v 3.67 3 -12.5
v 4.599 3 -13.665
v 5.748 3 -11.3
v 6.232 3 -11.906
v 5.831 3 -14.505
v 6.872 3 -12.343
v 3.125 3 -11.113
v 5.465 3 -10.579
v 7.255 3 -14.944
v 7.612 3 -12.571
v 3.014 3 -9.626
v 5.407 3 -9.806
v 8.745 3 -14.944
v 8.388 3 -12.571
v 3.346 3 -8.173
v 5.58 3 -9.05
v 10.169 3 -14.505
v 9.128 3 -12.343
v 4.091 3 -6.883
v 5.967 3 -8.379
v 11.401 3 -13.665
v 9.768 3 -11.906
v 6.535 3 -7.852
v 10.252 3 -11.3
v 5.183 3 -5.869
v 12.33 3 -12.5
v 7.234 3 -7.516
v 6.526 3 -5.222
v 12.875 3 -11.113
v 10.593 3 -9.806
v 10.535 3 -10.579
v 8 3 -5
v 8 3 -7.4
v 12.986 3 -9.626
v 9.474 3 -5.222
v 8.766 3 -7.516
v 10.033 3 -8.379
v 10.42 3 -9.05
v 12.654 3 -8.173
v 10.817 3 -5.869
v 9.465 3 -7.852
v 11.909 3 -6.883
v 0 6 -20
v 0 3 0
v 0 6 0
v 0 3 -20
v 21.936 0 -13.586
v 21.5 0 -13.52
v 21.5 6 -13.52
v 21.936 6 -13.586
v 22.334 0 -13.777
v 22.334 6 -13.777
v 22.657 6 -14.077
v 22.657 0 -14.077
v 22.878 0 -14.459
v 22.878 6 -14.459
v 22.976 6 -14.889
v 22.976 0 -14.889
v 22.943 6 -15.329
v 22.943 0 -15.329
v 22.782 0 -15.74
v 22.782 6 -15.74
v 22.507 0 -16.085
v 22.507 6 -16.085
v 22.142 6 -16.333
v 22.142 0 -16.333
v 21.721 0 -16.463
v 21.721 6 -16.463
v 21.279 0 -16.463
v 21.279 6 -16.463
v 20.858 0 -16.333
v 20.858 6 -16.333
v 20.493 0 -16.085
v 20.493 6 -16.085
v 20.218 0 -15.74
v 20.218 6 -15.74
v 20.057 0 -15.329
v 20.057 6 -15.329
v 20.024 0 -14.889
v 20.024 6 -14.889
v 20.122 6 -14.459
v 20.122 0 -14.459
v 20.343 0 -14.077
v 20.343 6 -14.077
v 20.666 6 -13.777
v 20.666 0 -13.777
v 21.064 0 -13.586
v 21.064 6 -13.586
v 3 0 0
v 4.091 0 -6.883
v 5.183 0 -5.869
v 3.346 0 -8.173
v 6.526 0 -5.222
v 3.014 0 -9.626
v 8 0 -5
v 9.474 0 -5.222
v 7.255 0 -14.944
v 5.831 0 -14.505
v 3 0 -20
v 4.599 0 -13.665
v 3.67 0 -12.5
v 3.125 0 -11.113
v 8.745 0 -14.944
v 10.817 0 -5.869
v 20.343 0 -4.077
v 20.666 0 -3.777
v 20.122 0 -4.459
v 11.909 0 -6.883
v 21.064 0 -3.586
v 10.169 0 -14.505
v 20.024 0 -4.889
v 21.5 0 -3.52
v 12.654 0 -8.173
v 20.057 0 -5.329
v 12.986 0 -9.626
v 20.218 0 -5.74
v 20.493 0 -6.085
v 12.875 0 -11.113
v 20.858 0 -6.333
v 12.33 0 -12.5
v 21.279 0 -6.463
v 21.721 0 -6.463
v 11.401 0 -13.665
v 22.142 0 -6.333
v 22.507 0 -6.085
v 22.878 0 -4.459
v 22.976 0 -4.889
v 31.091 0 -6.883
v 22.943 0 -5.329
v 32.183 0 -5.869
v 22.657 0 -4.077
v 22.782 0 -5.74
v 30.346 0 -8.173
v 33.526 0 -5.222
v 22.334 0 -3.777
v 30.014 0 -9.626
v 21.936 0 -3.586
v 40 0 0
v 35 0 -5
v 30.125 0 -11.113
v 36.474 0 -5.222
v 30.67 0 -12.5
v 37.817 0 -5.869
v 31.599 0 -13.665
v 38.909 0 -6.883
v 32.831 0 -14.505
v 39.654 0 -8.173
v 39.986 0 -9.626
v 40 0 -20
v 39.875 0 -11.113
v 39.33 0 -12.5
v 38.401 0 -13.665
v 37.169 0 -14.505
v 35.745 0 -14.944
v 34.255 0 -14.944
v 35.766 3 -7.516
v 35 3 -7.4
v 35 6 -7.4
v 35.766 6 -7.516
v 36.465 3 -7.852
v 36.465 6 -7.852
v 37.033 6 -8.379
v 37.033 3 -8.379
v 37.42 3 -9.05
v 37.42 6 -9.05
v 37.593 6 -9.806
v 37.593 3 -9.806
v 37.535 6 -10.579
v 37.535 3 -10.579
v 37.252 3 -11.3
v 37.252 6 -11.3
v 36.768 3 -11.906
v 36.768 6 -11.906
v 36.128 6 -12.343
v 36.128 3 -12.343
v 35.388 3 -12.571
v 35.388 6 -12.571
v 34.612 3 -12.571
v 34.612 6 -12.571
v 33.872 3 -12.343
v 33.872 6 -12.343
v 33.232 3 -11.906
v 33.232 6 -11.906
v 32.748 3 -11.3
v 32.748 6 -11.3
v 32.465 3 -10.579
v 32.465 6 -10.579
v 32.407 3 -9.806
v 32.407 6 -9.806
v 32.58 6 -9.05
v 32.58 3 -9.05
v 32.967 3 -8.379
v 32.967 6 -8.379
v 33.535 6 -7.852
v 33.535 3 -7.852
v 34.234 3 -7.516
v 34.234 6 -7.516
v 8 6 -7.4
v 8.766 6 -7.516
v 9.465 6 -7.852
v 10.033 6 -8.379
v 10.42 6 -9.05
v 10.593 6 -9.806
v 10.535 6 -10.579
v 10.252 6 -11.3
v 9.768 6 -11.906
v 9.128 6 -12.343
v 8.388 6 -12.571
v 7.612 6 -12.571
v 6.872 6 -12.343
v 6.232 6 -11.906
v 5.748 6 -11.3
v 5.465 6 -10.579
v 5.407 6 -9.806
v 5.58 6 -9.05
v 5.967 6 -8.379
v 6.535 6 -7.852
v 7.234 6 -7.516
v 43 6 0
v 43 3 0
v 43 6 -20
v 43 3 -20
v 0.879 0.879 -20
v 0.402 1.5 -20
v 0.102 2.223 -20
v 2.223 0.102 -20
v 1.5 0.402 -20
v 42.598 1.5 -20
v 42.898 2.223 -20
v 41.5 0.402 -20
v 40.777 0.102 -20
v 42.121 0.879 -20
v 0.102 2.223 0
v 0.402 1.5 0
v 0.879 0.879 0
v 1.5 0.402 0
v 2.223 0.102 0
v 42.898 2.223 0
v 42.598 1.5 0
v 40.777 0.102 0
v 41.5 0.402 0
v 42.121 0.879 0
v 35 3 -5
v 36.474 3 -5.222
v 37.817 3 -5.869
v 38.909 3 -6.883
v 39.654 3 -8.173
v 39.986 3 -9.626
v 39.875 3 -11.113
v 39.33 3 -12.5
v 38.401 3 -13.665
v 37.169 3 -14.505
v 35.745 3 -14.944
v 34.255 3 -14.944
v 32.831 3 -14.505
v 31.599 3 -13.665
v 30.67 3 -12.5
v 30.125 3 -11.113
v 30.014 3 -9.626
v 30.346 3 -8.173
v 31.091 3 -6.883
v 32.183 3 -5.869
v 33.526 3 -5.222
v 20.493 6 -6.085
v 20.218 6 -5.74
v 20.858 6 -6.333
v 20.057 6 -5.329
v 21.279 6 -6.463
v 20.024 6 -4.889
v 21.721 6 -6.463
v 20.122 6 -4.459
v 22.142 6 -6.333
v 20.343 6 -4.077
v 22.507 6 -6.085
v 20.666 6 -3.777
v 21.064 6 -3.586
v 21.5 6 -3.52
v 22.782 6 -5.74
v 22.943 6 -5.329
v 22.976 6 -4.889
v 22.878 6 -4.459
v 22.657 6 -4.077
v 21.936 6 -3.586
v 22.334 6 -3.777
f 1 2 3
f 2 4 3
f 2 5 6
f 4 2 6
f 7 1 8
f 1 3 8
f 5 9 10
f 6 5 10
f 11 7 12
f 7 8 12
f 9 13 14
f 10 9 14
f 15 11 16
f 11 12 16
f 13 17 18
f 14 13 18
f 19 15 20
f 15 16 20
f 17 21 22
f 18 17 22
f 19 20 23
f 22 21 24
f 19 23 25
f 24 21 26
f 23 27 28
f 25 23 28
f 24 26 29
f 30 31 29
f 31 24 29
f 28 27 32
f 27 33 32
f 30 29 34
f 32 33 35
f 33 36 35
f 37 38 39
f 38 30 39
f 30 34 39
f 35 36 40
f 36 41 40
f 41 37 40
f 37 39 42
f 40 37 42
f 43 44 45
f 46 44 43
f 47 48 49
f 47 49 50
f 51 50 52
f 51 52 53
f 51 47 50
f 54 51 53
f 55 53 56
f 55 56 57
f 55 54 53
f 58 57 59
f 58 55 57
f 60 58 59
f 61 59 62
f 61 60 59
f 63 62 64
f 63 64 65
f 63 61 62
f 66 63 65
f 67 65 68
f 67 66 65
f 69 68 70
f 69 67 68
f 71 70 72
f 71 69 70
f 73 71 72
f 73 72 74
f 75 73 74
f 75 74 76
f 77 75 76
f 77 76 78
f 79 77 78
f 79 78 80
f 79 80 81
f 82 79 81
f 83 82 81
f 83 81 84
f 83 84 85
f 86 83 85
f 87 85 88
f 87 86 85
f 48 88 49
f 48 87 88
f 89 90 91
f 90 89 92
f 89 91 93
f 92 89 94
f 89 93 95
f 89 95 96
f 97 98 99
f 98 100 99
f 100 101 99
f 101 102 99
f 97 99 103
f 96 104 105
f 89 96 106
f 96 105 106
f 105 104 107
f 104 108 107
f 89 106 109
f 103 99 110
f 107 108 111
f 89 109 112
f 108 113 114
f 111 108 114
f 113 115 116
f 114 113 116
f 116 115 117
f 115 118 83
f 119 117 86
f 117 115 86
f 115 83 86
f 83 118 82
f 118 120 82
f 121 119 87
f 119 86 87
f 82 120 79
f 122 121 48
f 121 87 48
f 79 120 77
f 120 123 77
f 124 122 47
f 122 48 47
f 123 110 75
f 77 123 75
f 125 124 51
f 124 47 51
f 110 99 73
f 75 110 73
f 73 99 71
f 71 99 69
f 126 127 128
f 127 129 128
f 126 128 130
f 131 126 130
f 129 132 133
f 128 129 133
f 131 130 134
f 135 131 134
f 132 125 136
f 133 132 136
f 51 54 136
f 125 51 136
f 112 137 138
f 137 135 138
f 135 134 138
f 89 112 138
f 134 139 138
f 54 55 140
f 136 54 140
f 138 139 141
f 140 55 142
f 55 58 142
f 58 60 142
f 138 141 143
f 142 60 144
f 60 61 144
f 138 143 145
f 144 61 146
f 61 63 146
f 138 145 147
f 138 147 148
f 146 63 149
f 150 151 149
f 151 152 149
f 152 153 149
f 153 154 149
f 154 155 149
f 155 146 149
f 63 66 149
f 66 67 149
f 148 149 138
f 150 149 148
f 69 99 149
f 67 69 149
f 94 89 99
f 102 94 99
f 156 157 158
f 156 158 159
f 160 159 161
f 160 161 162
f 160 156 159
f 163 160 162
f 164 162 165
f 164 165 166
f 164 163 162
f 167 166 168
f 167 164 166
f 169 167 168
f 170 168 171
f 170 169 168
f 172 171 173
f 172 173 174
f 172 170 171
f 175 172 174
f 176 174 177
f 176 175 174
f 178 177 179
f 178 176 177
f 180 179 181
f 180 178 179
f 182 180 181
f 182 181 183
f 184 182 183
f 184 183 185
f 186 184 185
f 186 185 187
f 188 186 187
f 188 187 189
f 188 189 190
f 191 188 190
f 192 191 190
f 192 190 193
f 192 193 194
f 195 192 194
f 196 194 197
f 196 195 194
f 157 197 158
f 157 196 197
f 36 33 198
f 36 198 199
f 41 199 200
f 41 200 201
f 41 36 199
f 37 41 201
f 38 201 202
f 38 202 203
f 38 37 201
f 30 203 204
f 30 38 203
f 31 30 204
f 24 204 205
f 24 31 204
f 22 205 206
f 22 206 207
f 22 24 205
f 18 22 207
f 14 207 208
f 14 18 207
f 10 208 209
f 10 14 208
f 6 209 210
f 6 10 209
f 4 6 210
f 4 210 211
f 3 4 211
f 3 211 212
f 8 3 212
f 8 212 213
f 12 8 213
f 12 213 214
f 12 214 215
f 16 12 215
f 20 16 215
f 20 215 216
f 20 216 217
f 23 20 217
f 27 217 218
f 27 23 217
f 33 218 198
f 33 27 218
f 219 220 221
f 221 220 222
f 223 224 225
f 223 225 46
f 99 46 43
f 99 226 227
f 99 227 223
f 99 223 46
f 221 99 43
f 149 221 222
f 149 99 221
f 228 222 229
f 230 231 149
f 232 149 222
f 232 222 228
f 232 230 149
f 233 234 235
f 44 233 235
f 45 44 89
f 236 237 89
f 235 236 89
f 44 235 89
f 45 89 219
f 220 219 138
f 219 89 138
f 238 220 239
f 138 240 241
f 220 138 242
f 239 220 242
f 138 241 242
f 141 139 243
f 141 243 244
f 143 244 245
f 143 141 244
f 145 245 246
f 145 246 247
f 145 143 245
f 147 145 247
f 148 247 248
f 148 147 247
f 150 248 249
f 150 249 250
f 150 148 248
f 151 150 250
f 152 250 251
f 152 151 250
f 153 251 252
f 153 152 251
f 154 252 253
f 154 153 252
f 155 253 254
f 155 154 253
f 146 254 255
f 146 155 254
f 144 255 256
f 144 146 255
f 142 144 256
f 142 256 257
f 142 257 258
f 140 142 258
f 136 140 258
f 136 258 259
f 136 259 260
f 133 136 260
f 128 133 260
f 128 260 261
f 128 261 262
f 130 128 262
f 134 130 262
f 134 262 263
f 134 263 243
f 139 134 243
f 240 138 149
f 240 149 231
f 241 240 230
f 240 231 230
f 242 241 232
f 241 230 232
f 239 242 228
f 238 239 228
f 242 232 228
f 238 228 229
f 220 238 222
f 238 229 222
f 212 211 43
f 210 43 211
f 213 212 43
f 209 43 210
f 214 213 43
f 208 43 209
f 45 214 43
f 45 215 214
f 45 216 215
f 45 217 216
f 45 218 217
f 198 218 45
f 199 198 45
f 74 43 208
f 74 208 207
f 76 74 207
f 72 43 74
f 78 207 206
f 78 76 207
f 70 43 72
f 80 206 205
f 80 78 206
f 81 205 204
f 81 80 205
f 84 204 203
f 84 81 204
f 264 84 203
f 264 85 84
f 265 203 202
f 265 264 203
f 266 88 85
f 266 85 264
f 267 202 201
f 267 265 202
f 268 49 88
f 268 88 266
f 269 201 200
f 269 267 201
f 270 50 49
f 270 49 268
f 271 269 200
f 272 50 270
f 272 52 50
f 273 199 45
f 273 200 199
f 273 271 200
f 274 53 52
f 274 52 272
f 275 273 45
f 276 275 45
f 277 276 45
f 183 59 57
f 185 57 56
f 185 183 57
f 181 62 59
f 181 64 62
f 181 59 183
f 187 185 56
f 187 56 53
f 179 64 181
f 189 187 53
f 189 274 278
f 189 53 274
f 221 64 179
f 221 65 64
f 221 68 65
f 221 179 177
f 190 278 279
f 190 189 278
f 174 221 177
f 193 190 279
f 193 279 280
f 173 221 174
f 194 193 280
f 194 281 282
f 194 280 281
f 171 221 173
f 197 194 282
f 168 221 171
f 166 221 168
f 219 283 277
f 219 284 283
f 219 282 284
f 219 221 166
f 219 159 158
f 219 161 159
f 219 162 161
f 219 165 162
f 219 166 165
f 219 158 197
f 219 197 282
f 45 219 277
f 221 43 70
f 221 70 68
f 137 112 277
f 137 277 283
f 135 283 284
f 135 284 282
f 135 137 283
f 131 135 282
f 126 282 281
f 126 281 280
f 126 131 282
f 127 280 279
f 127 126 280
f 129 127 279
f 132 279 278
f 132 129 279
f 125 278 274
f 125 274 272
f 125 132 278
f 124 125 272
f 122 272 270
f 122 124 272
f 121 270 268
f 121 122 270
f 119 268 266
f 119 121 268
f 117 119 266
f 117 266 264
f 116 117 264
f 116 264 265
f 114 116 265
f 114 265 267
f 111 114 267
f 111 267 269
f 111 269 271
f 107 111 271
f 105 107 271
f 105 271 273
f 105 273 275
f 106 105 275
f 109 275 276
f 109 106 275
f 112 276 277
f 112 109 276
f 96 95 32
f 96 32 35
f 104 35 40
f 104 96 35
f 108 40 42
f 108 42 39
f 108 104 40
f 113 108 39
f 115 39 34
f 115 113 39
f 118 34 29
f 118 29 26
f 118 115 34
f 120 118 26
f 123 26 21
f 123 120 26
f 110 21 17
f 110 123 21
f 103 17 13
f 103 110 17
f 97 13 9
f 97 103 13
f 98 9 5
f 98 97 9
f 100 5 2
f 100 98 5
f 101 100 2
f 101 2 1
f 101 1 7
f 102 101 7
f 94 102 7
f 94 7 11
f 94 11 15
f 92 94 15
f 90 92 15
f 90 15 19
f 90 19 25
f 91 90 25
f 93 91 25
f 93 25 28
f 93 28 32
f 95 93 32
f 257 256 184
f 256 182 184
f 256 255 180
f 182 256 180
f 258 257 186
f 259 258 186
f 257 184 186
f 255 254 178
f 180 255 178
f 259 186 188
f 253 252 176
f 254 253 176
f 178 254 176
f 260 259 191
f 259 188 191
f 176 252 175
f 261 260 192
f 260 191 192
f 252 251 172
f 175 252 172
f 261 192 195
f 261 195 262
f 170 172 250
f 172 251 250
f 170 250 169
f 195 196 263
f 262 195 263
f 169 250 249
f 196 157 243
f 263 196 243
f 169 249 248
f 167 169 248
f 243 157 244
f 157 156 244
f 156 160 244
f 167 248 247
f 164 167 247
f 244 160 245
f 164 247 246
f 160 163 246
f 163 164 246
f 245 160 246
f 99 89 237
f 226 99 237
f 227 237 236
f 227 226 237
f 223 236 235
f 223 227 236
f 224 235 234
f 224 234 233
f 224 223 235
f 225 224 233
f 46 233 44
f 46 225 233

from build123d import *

# Parameters (mm, degrees)
SKETCH_1_W      = 43
SKETCH_1_H      = 20
SKETCH_1_R      = 5
SKETCH_1_R_2    = 1.48
EXTRUDE_1_DEPTH = 6
EXTRUDE_START   = -3
SKETCH_2_R      = 5
SKETCH_2_R_2    = 2.6
EXTRUDE_2_DEPTH = 3
FILLET_1_R      = 3


with BuildPart() as part:
    # 草图1 → 凸台-拉伸1 (new body)
    with BuildSketch(Plane(origin=(0, 0, 0), x_dir=(1, 0, 0), z_dir=(0, 1, 0))):
        with Locations((21.5, 10)):
            Rectangle(SKETCH_1_W, SKETCH_1_H)
        with Locations(Location((8, 10, 0), (0, 0, 270))):
            Circle(SKETCH_1_R, mode=Mode.SUBTRACT)
        with Locations(Location((35, 10, 0), (0, 0, 270))):
            Circle(SKETCH_1_R, mode=Mode.SUBTRACT)
        with Locations(Location((21.5, 15, 0), (0, 0, 270))):
            Circle(SKETCH_1_R_2, mode=Mode.SUBTRACT)
        with Locations(Location((21.5, 5, 0), (0, 0, 270))):
            Circle(SKETCH_1_R_2, mode=Mode.SUBTRACT)
    extrude(amount=EXTRUDE_1_DEPTH)

    # 草图2 → 凸台-拉伸2 (add)
    # profile 1 of 2: a face of its own
    with BuildSketch(Plane(origin=(0, 6, 0), x_dir=(1, 0, 0), z_dir=(0, 1, 0)).offset(EXTRUDE_START)):
        with Locations(Location((8, 10, 0), (0, 0, 270))):
            Circle(SKETCH_2_R)
        with Locations(Location((8, 10, 0), (0, 0, 270))):
            Circle(SKETCH_2_R_2, mode=Mode.SUBTRACT)
    # profile 2 of 2: a face of its own
    with BuildSketch(Plane(origin=(0, 6, 0), x_dir=(1, 0, 0), z_dir=(0, 1, 0)).offset(EXTRUDE_START)):
        with Locations(Location((35, 10, 0), (0, 0, 270))):
            Circle(SKETCH_2_R)
        with Locations(Location((35, 10, 0), (0, 0, 270))):
            Circle(SKETCH_2_R_2, mode=Mode.SUBTRACT)
    extrude(amount=EXTRUDE_2_DEPTH)

    # 圆角1
    fillet_1_edges = [part.edges().sort_by_distance(p)[0] for p in [
        (43, 0, -10),
        (0, 0, -10),
    ]]
    fillet(fillet_1_edges, radius=FILLET_1_R - 0.0001)  # a hair under: the kernel refuses the full size


solid = part.part
